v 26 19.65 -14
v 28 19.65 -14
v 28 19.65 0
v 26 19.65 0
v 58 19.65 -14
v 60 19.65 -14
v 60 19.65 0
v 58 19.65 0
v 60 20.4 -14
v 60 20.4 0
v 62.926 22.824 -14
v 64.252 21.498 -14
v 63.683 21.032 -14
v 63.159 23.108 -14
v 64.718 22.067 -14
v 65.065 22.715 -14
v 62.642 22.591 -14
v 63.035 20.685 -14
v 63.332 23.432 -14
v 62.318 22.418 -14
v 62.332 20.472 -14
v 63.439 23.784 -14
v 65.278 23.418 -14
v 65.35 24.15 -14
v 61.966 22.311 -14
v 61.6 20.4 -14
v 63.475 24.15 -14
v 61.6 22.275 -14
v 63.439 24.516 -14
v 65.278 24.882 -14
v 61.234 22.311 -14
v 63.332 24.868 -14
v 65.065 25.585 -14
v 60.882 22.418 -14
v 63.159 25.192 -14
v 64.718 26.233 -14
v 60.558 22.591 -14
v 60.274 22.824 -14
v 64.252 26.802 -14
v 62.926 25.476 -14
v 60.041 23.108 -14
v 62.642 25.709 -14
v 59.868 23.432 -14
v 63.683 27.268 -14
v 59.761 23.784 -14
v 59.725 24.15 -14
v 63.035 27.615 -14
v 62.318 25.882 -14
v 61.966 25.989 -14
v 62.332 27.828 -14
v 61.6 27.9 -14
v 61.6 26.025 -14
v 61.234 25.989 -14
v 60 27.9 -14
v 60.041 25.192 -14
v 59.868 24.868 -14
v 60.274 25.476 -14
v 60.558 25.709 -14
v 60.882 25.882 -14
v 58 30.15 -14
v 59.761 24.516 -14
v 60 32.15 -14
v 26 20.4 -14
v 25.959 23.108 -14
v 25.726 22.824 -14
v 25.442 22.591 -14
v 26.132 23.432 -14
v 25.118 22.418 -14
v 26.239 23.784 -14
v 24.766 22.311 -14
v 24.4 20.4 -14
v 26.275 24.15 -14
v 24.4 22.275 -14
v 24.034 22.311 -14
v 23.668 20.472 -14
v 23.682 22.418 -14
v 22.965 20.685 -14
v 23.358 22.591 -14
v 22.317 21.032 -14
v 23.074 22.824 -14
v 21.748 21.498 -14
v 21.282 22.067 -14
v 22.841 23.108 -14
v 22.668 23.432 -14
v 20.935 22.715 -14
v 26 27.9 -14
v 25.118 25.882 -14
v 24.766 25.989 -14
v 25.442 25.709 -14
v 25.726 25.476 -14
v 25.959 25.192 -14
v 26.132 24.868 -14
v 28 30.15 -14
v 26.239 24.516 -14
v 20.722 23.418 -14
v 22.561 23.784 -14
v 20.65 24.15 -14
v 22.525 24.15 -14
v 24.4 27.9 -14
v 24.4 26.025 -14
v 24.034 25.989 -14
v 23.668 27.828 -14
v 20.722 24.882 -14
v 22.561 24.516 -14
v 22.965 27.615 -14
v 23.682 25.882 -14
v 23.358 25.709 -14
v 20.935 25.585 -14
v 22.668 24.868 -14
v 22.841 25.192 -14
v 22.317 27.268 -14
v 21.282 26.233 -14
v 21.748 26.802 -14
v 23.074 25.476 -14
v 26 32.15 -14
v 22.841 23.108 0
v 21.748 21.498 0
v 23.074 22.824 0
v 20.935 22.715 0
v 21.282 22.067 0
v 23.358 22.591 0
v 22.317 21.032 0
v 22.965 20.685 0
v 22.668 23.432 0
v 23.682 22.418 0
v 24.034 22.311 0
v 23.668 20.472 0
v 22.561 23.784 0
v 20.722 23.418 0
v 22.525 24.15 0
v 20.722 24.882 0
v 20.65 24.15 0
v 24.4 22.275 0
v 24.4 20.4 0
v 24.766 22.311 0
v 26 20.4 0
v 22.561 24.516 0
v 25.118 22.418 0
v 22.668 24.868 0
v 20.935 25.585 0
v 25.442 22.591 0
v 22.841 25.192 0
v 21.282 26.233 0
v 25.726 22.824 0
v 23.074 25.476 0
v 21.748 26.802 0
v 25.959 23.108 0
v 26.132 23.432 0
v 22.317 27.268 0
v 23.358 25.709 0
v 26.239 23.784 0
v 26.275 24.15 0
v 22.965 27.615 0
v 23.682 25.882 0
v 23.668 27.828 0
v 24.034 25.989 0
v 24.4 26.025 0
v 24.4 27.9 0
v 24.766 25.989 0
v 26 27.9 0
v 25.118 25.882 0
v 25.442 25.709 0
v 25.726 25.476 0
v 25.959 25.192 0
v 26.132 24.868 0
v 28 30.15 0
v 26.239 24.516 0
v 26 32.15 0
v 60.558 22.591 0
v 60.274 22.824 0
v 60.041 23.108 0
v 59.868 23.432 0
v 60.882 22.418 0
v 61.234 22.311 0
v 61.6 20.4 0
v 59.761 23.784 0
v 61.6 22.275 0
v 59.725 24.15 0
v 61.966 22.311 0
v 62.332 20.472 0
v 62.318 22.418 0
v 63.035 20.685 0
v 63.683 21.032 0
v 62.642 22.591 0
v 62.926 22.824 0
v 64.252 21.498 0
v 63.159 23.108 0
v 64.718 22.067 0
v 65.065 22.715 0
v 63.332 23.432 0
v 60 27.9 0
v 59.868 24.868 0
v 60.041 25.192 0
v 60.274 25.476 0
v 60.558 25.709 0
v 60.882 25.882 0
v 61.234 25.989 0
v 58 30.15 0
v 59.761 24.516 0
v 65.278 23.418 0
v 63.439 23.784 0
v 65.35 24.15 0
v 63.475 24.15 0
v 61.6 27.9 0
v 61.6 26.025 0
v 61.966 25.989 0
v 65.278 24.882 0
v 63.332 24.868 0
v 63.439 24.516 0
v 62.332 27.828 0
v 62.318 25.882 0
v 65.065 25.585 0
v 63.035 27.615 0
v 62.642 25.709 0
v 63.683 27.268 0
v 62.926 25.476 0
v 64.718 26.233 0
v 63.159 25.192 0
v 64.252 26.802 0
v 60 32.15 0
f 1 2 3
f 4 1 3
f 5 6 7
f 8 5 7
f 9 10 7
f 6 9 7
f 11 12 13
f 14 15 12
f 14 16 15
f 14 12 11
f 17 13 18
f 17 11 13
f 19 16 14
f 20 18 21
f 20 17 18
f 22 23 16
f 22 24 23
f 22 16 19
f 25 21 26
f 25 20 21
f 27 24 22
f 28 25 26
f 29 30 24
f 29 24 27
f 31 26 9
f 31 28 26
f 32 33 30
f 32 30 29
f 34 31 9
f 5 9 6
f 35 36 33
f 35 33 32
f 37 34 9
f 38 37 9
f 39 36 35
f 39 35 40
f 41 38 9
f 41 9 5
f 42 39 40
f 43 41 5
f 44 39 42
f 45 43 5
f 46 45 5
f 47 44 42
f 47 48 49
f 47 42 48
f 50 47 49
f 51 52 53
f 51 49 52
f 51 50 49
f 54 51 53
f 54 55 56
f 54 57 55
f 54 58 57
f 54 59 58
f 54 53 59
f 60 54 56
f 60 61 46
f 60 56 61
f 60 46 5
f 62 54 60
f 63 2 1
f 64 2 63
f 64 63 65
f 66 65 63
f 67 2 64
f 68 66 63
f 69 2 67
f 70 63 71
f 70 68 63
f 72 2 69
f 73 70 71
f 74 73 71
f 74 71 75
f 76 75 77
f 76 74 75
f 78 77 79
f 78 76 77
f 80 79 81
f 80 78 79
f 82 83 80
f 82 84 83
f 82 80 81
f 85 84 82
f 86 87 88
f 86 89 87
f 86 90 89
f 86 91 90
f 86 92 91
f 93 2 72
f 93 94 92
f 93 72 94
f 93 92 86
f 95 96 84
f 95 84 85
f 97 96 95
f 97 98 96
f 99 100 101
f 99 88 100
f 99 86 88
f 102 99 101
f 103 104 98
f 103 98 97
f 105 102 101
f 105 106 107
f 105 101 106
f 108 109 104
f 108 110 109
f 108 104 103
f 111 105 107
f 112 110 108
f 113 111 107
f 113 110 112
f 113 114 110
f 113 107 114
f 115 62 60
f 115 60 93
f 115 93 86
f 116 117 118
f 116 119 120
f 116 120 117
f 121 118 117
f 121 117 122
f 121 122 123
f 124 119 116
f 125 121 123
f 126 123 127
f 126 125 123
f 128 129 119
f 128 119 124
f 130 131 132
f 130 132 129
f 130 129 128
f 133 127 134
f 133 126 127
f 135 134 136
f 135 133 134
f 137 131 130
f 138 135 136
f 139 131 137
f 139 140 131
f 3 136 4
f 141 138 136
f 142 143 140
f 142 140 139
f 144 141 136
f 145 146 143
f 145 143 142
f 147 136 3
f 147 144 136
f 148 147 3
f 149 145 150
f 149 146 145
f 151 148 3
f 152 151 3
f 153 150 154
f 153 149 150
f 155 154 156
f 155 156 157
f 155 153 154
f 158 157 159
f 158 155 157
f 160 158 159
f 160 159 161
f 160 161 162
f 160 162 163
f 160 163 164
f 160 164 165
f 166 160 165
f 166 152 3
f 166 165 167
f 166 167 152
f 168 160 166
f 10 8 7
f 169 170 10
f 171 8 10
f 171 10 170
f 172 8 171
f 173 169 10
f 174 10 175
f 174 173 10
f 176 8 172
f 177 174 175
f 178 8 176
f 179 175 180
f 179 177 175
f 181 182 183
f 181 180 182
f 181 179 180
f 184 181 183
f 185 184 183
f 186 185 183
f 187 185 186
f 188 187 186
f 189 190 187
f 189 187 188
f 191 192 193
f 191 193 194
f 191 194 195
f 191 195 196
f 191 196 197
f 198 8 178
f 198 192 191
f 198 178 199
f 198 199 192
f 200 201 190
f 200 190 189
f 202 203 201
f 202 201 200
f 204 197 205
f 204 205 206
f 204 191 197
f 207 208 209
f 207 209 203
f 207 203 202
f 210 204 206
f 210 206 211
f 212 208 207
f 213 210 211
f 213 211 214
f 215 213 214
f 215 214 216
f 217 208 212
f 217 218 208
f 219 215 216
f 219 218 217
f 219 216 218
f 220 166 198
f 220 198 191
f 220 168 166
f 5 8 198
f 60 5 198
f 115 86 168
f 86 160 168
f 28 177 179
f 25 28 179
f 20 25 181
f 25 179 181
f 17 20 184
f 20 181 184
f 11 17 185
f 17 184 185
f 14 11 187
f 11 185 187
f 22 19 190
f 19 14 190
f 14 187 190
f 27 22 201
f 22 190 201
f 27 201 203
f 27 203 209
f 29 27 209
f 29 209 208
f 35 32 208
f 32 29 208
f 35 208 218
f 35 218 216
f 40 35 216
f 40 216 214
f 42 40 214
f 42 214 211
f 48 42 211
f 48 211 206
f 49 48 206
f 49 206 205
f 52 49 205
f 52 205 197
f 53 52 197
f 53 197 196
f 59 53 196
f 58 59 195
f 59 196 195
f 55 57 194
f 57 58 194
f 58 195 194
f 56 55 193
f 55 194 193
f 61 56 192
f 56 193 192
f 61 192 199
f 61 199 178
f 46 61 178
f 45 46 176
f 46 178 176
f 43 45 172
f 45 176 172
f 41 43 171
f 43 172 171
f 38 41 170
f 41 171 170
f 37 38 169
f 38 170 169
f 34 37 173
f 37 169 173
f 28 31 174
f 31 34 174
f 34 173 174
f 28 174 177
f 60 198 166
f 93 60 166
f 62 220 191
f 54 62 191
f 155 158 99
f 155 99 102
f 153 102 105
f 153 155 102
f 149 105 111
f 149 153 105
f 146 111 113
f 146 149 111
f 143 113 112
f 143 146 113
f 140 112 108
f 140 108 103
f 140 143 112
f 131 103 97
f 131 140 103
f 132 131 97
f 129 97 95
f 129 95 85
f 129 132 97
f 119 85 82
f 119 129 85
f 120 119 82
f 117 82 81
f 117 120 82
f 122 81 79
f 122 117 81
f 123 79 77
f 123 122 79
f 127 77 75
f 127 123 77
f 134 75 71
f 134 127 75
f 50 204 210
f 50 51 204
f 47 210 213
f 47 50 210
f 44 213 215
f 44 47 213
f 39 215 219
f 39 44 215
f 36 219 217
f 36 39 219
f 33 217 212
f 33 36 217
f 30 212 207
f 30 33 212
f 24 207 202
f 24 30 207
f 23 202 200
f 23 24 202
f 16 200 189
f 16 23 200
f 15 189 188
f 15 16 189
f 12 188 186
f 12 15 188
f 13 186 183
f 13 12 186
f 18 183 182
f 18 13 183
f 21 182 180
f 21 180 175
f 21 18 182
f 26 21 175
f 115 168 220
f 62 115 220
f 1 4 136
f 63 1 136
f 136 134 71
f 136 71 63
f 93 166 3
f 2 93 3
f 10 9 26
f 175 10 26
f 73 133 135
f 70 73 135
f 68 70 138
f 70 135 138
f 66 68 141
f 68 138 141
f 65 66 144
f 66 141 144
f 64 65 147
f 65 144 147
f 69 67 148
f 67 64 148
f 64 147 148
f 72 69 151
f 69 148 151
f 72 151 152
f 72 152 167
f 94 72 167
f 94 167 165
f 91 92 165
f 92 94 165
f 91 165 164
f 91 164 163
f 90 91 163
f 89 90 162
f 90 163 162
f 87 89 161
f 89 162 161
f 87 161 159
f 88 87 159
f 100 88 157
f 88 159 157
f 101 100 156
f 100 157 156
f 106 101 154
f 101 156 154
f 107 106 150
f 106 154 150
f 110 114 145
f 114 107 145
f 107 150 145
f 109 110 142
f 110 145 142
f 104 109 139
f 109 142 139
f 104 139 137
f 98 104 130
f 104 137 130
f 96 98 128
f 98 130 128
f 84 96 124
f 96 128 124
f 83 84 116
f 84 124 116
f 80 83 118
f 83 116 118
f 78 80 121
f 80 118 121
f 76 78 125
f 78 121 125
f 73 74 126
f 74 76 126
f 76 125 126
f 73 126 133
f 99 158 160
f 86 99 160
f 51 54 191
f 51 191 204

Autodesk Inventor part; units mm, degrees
ref_plane "YZ Plane" through (0, 0, 0) normal (1, 0, 0) x (0, 1, 0)
ref_plane "XZ Plane" through (0, 0, 0) normal (0, 1, 0) x (-1, 0, 0)
ref_plane "XY Plane" through (0, 0, 0) normal (0, 0, 1) x (1, 0, 0)
sketch "スケッチ1" plane through (0, 0, 0) normal (0, 0, 1) x (1, 0, 0)
  line L0 (0, 0) -> (0, 17.65)
  line L1 (0, 17.65) -> (28, 17.65)
  line L2 (28, 17.65) -> (28, 30.15)
  line L3 (28, 30.15) -> (58, 30.15)
  line L4 (58, 30.15) -> (58, 0)
  line L5 (58, 0) -> (60, 0)
  line L6 (60, 0) -> (60, 32.15)
  line L7 (60, 32.15) -> (28, 32.15)
  line L8 (28, 32.15) -> (26, 32.15)
  line L9 (26, 32.15) -> (26, 19.65)
  line L10 (26, 19.65) -> (-2, 19.65)
  line L11 (-2, 19.65) -> (-2, 0)
  line L12 (-2, 0) -> (0, 0)
  dimension "d0" = 17.65
  dimension "d1" = 28
  dimension "d2" = 12.5
  dimension "d3" = 30
  dimension "d4" = 2
  dimension "d5" = 32.15
  dimension "d6" = 32
  dimension "d7" = 2
  dimension "d8" = 12.5
  dimension "d9" = 28
extrude "押し出し1" add sketch "スケッチ1" along normal blind 14
sketch "スケッチ2" plane through (60, 0, 0) normal (1, 0, 0) x (0, 0, -1)
  line L0 (0, 0) -> (-14, 0) projected
  line L1 (-14, 0) -> (0, 0)
  line L2 (0, 0) -> (0, 2)
  line L3 (0, 2) -> (-14, 2)
  line L4 (-14, 2) -> (-14, 0)
  dimension "d12" = 14
  dimension "d13" = 2
extrude "押し出し2" add sketch "スケッチ2" along normal blind 7
sketch "スケッチ3" plane through (-2, 0, 0) normal (-1, 0, 0) x (0, 0, 1)
  line L0 (14, 2) -> (0, 2) projected
  line L1 (0, 0) -> (14, 0)
  line L2 (14, 0) -> (14, 2)
  line L3 (14, 2) -> (0, 2)
  line L4 (0, 2) -> (0, 0)
  dimension "d16" = 14
extrude "押し出し3" add sketch "スケッチ3" along normal blind 7
sketch "スケッチ4" plane through (0, 0, 14) normal (0, 0, 1) x (1, 0, 0)
  line L0 (60, 32.15) -> (60, 24.15)
  line L1 (60, 24.15) -> (61.6, 24.15)
  arc A0 (61.6, 20.4) -> (61.6, 27.9) centre (61.6, 24.15) ccw
  line L2 (61.6, 24.15) -> (61.6, 20.4) construction
  line L3 (61.6, 24.15) -> (61.6, 27.9) construction
  line L4 (61.6, 27.9) -> (60, 27.9)
  line L5 (61.6, 20.4) -> (60, 20.4)
  line L6 (60, 2) -> (60, 32.15) projected
  line L7 (60, 27.9) -> (60, 20.4)
  point P0 (0, 0)
  dimension "d47" = 8
  dimension "d48" = 1.6
  dimension "d49" = 3.75
  dimension "d50" = 180
extrude "押し出し4" add sketch "スケッチ4" against normal blind 14
hole "穴3" at (61.6, 24.15, 14) direction (0, 0, -1) diameter 3.75 end through all
sketch "スケッチ7" plane through (0, 0, 14) normal (0, 0, 1) x (1, 0, 0)
  line L0 (60, 32.15) -> (26, 32.15) projected
  line L1 (26, 32.15) -> (26, 24.15)
  line L2 (26, 24.15) -> (24.4, 24.15)
  arc A0 (24.4, 27.9) -> (24.4, 20.4) centre (24.4, 24.15) ccw
  line L3 (24.4, 27.9) -> (26, 27.9)
  line L4 (24.4, 20.4) -> (26, 20.4)
  line L5 (26, 20.4) -> (26, 27.9)
  line L6 (26, 32.15) -> (26, 19.65) projected
  circle A1 centre (24.4, 24.15) radius 1.875
  point P0 (0, 0)
  dimension "d60" = 8
  dimension "d61" = 1.6
  dimension "d62" = 3.75
  dimension "d63" = 3.75
extrude "押し出し6" add sketch "スケッチ7" against normal blind 14 contours L1 A1 L5 L4 A0 L3 | L1 L5 A1 picked at (23.6929, 24.15)
hole "穴4" at (24.4, 24.15, 14) direction (0, 0, -1) diameter 3.75 end through all
sketch "スケッチ10" plane through (0, 17.65, 0) normal (0, -1, 0) x (1, 0, 0)
  line L0 (28, 14) -> (58, 14) projected
  line L1 (0, 0) -> (28, 0)
  line L2 (28, 0) -> (28, 14)
  line L3 (28, 14) -> (0, 14)
  line L4 (0, 14) -> (0, 0)
extrude "押し出し7" cut sketch "スケッチ10" against normal blind 0.6
sketch "スケッチ11" plane through (0, 0, 0) normal (0, -1, 0) x (1, 0, 0)
  line L0 (0, 14) -> (-9, 14) projected
  line L1 (60, 0) -> (67, 0) projected
  line L2 (-9, 14) -> (67, 14)
  line L3 (67, 14) -> (67, 0)
  line L4 (67, 0) -> (-9, 0)
  line L5 (-9, 0) -> (-9, 14)
  point P0 (0, 0)
extrude "押し出し8" cut sketch "スケッチ11" against normal blind 0.6
sketch "スケッチ12" plane through (0, 0, 14) normal (0, 0, 1) x (1, 0, 0)
  line L0 (-2, 19.65) -> (-2, 2) projected
  line L1 (-2, 19.65) -> (4, 19.65)
  line L2 (26, 19.65) -> (-2, 19.65) projected
  line L3 (4, 19.65) -> (4, 18.25)
  line L4 (0, 18.25) -> (28, 18.25) projected
  line L5 (4, 18.25) -> (0.2844, 14.5344)
  line L6 (4, 18.25) -> (9.2547, 18.25) construction
  line L7 (0.2844, 14.5344) -> (0, 14.25)
  line L8 (0, 0.6) -> (0, 18.25) projected
  line L9 (0, 14.25) -> (-2, 14.25)
  line L10 (-2, 14.25) -> (-2, 19.65)
  point P0 (0, 0)
  dimension "d79" = 6
  dimension "d80" = 135
extrude "押し出し9" add sketch "スケッチ12" along normal blind 2
sketch "スケッチ15" plane through (0, 0, 0) normal (0, 0, -1) x (-1, 0, 0)
  line L0 (0, 0.6) -> (0, 18.25) projected
  line L1 (0, 18.25) -> (-14, 18.25)
  line L2 (-14, 18.25) -> (-14, 0.6)
  line L3 (-14, 0.6) -> (0, 0.6)
  line L4 (0, 0.6) -> (0, 18.25)
  point P0 (0, 0)
  dimension "d88" = 14
extrude "押し出し11" add sketch "スケッチ15" against normal blind 1.4
sketch "スケッチ17" plane through (67, 0, 0) normal (1, 0, 0) x (0, 0, -1)
  line L0 (0, 0.6) -> (-14, 0.6) projected
  line L1 (0, 0.6) -> (-14, 0.6)
  line L2 (-14, 0.6) -> (-14, 9.5309)
  line L3 (-14, 9.5309) -> (0, 9.5309)
  line L4 (0, 9.5309) -> (0, 0.6)
  point P0 (0, 0)
extrude "押し出し13" cut sketch "スケッチ17" against normal blind 3
sketch "スケッチ18" plane through (-9, 0, 0) normal (-1, 0, 0) x (0, 0, 1)
  line L0 (0, 0.6) -> (14, 0.6) projected
  line L1 (0, 0.6) -> (14, 0.6)
  line L2 (14, 0.6) -> (14, 6.5)
  line L3 (14, 6.5) -> (0, 6.5)
  line L4 (0, 6.5) -> (0, 0.6)
  point P0 (0, 0)
extrude "押し出し14" cut sketch "スケッチ18" against normal blind 3
hole "穴5" at (-4, 2, 7) direction (0, -1, 0) diameter 2.4 end through all
hole "穴6" at (62, 2, 7) direction (0, -1, 0) diameter 2.4 end through all
mirror "ミラー1" about plane through (31.8158, 20.0509, 0) normal (0, 0, -1) of "押し出し3", "押し出し1", "押し出し4", "穴3", "押し出し2", "穴6", "穴4", "押し出し6", "押し出し7", "押し出し9", "押し出し11", "押し出し14", "押し出し13", "穴5", "押し出し8"
sketch "スケッチ19" plane through (0, 0, 14) normal (0, 0, 1) x (1, 0, 0)
  line L0 (94.8832, 81.412) -> (-62.365, 81.412)
  line L1 (-62.365, 81.412) -> (-62.365, -71.7744)
  line L2 (-62.365, -71.7744) -> (94.8832, -71.7744)
  line L3 (94.8832, -71.7744) -> (94.8832, 81.412)
  point P0 (0, 0)
extrude "押し出し15" cut sketch "スケッチ19" against normal blind 14
sketch "スケッチ20" plane through (-2, 19.65, 14) normal (0, 1, 0) x (1, 0, 0)
  line L0 (17.6833, -4.2941) -> (-12.6138, -4.2941)
  line L1 (-12.6138, -4.2941) -> (-12.6138, 1.0873)
  line L2 (-12.6138, 1.0873) -> (17.6833, 1.0873)
  line L3 (17.6833, 1.0873) -> (17.6833, -4.2941)
  point P0 (2, 14)
extrude "押し出し16" cut sketch "スケッチ20" against normal blind 14
sketch "スケッチ21" plane through (26, 27.9, -14) normal (-1, 0, 0) x (0, 0, 1)
  line L0 (0, -8.25) -> (-2, -8.25) projected
  line L1 (-2, -8.25) -> (18.9234, -8.25)
  line L2 (18.9234, -8.25) -> (18.9234, 5.2405)
  line L3 (18.9234, 5.2405) -> (-2, 5.2405)
  line L4 (-2, 5.2405) -> (-2, -8.25)
  point P0 (14, -27.9)
split body "分割1" sketch "スケッチ21" result one side removed curves L2 L3 L4 L1 removed pieces at (9.3333, 19.15, -4.6667) (58.5, 13.3, -4.6667)
properties part number "センサ冶具小"
